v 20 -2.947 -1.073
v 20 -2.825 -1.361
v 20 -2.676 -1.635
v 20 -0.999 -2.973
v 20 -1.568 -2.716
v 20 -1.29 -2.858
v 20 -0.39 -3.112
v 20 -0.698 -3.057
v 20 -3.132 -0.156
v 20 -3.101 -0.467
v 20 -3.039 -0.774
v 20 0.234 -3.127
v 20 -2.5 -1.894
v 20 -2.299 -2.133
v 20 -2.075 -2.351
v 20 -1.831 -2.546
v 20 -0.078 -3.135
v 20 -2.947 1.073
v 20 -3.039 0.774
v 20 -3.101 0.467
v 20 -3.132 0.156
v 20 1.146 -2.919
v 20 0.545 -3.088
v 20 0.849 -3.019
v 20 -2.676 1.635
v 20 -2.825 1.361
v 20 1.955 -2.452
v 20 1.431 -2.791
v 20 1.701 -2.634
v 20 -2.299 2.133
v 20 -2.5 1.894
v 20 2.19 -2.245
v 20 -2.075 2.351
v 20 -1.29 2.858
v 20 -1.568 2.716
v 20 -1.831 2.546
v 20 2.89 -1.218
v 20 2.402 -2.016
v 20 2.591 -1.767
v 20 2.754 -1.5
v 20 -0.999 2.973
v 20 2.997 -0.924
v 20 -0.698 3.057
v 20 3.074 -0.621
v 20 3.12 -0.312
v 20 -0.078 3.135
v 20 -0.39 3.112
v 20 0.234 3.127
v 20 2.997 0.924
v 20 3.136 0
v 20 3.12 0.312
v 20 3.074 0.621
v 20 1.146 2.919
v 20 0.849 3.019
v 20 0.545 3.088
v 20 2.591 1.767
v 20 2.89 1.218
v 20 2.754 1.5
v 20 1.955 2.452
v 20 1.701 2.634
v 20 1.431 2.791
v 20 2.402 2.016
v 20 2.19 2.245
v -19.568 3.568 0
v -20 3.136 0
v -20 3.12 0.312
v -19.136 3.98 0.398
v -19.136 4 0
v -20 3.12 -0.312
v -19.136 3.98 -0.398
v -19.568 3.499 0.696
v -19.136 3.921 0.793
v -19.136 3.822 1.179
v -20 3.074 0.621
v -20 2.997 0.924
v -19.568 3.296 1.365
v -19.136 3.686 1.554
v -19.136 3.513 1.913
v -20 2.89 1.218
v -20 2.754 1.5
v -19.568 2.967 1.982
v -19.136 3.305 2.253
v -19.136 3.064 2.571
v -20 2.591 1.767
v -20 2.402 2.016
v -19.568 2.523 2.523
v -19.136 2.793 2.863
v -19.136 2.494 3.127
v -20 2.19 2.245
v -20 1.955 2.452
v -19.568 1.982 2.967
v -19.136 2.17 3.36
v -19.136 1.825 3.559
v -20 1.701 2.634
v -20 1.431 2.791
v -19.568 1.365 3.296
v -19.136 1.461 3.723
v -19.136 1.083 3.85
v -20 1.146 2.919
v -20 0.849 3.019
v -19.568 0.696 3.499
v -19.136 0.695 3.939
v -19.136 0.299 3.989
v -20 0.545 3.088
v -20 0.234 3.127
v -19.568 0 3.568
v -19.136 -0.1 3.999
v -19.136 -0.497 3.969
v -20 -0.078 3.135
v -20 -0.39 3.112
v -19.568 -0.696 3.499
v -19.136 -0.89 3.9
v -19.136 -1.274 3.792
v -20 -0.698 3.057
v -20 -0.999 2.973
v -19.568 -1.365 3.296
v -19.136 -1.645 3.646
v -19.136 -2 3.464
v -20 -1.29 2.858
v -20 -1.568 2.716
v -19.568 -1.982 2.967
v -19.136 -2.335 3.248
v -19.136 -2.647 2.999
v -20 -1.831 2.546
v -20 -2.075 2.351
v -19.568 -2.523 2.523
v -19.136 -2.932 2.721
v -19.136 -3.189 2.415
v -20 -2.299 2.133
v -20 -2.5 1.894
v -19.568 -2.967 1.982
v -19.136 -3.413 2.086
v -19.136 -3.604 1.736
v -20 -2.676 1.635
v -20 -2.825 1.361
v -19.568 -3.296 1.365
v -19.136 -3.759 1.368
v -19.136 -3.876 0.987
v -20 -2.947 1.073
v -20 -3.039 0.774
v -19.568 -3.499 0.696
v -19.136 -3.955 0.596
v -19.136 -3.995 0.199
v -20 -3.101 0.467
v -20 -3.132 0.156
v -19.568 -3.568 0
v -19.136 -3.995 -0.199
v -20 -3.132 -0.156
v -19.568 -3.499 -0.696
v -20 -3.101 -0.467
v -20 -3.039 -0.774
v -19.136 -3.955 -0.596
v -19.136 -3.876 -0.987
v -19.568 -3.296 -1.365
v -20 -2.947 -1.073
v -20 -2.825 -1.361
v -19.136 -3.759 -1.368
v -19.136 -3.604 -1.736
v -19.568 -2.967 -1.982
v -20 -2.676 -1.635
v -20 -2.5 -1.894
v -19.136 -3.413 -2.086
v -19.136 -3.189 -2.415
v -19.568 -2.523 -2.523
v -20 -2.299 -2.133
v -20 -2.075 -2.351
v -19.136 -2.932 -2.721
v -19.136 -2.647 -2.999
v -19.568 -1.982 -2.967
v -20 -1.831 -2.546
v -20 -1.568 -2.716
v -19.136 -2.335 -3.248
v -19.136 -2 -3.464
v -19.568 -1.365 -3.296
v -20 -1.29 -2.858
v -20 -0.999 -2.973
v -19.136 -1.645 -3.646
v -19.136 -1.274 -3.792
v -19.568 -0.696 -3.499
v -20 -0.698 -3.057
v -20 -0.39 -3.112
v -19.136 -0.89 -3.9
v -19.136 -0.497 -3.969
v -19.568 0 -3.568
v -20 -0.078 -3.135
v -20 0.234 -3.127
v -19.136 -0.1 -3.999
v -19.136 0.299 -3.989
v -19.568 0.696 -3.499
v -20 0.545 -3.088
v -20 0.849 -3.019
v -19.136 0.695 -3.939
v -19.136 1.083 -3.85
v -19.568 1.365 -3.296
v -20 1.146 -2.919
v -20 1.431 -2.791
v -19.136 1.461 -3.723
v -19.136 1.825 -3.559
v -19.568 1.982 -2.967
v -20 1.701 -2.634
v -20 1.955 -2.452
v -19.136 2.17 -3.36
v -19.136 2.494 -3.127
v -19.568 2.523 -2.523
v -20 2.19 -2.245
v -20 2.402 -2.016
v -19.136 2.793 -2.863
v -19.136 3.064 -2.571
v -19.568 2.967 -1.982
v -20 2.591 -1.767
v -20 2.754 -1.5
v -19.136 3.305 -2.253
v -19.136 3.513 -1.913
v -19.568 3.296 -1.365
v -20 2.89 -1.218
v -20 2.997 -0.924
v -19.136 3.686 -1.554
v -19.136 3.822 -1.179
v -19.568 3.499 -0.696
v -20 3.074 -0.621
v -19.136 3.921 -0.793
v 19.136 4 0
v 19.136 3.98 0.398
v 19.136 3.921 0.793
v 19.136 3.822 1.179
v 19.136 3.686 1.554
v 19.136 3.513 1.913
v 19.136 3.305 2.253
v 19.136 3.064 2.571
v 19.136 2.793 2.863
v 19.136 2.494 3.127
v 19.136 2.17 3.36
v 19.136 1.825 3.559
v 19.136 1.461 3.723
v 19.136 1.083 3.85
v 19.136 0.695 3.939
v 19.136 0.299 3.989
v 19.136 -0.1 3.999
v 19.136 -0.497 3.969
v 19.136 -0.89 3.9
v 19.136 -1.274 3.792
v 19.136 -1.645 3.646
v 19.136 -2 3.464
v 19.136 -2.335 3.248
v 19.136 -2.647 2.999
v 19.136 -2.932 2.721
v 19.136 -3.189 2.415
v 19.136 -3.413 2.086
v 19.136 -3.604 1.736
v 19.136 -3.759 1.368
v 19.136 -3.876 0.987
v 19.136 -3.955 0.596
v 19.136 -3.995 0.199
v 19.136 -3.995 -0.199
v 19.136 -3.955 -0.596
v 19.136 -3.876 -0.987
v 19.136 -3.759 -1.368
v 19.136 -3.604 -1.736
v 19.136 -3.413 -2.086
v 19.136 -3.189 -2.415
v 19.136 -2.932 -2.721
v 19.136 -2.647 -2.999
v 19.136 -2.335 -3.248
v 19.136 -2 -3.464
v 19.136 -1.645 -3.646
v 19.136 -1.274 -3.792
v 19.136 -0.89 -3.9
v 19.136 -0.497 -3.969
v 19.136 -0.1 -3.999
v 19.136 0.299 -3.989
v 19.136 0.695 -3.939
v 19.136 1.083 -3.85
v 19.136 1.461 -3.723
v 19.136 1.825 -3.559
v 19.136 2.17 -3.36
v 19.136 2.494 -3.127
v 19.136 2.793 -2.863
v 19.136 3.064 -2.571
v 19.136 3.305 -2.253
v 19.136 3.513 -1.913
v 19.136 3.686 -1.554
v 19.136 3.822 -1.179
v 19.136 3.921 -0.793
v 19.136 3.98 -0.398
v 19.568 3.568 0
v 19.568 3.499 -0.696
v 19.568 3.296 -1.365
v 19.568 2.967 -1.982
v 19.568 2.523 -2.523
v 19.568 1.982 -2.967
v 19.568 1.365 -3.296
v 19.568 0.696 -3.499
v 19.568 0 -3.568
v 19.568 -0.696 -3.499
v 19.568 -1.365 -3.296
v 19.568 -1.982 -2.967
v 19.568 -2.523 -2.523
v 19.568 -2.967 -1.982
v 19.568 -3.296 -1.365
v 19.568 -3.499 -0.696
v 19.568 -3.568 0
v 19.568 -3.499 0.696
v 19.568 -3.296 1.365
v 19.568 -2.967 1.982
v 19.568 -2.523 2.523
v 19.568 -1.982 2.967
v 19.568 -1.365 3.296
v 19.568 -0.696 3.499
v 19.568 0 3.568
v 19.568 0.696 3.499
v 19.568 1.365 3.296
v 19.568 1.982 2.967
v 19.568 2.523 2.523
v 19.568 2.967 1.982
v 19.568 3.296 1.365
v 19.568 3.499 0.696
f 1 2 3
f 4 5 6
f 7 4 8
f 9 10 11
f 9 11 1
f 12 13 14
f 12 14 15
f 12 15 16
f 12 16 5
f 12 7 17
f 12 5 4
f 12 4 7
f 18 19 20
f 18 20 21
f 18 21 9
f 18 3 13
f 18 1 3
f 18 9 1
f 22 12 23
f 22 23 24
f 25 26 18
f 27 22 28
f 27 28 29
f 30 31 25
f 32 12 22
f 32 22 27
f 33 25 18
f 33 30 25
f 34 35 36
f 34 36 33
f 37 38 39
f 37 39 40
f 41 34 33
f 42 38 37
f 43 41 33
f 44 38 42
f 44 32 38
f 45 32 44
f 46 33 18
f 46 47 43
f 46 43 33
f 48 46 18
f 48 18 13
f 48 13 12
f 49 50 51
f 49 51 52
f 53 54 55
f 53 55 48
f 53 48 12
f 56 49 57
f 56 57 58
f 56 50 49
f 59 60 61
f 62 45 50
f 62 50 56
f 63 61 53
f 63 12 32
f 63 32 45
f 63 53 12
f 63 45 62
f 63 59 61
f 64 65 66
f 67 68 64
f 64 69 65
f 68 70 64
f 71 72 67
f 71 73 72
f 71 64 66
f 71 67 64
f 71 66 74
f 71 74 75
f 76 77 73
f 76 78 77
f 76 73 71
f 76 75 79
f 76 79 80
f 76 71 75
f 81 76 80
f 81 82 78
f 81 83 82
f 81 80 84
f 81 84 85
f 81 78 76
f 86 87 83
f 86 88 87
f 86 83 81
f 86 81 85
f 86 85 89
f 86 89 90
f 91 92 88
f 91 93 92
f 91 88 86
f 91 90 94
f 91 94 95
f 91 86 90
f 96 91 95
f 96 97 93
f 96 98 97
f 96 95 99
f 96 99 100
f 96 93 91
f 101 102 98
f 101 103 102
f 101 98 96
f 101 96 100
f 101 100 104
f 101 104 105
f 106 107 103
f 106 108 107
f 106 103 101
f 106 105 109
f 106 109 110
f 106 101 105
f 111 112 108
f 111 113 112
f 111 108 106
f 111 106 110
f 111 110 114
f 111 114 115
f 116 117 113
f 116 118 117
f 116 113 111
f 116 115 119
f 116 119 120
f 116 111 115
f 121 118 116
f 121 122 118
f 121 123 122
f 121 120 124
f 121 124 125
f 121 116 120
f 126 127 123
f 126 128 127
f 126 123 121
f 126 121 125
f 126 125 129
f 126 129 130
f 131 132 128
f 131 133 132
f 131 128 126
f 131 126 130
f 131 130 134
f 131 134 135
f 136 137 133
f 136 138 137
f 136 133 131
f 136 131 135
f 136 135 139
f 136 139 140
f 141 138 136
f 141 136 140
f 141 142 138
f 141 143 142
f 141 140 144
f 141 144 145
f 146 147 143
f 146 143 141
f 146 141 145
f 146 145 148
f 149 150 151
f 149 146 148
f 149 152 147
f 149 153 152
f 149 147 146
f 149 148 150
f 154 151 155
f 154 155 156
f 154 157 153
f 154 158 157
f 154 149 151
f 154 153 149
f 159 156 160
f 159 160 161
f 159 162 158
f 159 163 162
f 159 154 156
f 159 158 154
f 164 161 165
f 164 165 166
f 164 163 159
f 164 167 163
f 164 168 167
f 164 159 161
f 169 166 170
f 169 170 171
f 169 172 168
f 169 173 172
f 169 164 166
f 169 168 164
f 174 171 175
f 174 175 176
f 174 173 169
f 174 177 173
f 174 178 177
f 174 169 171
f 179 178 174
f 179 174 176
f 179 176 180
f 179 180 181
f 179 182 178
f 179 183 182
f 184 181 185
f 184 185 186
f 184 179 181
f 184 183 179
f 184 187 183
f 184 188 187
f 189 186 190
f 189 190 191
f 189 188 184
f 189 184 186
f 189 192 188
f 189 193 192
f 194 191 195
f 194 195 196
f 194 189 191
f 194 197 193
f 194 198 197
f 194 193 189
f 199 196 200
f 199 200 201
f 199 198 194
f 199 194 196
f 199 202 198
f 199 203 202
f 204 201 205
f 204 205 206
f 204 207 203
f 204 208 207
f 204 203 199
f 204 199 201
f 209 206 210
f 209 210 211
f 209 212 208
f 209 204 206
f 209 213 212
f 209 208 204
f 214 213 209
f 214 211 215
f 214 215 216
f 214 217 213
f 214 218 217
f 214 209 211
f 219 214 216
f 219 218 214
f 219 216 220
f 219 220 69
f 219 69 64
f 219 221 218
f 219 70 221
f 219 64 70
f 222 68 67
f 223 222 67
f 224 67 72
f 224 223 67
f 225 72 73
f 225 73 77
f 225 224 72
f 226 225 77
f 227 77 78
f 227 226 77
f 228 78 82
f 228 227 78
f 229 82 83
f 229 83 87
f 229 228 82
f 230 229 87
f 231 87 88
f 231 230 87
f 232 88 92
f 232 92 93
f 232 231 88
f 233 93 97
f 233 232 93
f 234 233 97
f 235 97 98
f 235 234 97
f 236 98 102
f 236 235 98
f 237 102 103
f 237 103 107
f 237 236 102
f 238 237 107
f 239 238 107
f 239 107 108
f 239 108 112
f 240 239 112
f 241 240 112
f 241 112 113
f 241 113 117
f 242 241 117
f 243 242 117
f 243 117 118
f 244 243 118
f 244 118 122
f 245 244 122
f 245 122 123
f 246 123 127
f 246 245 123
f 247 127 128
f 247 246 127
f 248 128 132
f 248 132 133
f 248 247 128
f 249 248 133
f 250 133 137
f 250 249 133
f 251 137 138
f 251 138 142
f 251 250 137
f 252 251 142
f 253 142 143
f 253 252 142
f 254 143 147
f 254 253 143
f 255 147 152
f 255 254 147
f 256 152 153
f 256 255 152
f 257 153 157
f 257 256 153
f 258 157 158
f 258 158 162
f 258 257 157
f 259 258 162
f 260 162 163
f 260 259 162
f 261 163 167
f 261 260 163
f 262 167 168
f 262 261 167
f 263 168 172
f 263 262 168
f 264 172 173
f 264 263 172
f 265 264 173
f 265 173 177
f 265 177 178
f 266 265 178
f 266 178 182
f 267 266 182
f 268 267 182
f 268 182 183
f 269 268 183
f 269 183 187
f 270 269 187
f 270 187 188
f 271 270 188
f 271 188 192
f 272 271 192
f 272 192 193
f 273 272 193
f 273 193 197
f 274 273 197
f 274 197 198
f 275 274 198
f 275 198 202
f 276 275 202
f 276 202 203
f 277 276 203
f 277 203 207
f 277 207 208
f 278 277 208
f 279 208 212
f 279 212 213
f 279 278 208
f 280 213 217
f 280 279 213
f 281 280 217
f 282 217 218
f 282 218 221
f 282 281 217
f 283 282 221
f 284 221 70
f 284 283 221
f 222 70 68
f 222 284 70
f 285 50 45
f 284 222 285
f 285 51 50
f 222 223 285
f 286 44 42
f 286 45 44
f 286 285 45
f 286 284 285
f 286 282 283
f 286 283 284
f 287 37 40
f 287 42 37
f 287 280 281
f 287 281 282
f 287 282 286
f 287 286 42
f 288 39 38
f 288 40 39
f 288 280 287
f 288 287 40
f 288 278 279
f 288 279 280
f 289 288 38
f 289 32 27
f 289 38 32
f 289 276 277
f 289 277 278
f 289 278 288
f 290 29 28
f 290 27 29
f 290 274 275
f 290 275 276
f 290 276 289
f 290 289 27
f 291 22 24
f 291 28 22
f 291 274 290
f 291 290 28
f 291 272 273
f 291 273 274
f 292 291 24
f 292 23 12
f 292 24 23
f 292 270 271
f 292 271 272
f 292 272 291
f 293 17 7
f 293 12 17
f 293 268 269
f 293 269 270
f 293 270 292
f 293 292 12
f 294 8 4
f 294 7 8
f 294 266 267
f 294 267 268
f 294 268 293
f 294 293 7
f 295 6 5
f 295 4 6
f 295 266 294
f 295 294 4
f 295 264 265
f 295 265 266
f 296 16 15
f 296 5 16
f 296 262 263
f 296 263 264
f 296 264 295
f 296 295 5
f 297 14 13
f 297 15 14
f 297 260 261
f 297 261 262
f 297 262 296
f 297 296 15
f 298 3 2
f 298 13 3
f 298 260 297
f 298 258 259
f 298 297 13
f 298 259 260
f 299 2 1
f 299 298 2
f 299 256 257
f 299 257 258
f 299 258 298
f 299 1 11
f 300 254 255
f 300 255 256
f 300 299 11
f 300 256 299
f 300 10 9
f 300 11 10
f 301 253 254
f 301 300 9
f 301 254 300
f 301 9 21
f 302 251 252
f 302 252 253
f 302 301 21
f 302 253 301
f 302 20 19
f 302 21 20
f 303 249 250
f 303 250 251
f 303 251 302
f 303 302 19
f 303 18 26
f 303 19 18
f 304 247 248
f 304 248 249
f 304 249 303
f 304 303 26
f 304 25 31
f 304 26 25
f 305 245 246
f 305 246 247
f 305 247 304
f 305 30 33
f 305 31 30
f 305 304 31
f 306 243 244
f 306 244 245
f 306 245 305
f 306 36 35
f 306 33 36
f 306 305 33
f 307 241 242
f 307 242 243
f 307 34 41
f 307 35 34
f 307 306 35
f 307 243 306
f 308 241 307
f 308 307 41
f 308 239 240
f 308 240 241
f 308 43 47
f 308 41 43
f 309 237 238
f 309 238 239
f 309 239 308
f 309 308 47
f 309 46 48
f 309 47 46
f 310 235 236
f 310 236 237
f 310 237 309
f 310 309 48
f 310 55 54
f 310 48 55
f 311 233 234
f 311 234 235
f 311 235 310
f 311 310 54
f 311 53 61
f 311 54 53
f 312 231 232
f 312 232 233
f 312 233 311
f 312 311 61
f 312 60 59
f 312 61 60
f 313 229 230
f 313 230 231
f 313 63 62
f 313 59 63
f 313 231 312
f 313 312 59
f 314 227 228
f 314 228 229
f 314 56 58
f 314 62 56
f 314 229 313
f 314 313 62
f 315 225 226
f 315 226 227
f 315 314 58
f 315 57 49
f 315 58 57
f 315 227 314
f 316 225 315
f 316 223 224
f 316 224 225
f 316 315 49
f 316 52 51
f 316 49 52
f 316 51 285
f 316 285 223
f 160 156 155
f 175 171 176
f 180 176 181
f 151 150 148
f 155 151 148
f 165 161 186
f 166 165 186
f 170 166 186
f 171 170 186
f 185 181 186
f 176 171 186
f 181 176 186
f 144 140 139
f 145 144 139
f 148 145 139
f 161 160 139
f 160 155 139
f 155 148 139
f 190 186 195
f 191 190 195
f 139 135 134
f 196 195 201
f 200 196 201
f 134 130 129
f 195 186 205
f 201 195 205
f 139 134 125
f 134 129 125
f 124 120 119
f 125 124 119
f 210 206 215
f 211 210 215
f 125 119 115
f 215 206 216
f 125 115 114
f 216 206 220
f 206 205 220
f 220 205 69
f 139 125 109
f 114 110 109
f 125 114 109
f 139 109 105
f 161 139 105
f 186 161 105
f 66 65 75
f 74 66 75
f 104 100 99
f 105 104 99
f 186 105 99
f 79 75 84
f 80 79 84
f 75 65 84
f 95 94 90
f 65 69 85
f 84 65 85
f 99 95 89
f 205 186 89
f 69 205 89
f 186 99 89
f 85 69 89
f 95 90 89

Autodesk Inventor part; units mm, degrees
ref_plane "YZ Plane" through (0, 0, 0) normal (1, 0, 0) x (0, 1, 0)
ref_plane "XZ Plane" through (0, 0, 0) normal (0, 1, 0) x (-1, 0, 0)
sketch "Schizzo1" plane through (0, 0, 0) normal (0, 0, 1) x (1, 0, 0)
  line L0 (20, 4) -> (20, 0)
  line L1 (-20, 0) -> (20, 0)
  line L2 (-28, 0) -> (28, 0) projected
  line L3 (0, 4.8) -> (0, -0.8) projected
  line L4 (-20, 4) -> (-20, 0)
  line L5 (0, 4) -> (0, 0) construction
  line L6 (-28, 0) -> (28, 0) projected
  line L7 (-20, 4) -> (20, 4)
  dimension "d13" = 8
  dimension "d87" = 40
  dimension "d88" = 20
revolve "Corpo" add sketch "Schizzo1" angle 360 about axis through (-20, 0, 0) along (1, 0, 0)
thread "Filettatura1" size "M8x1.25" class "6g" standard "ISO Metric profile" length 40
chamfer "Smusso1" distance 0.864 angle 45 1 edges at (20, -4, 0) measured on face at (-6.6667, 3.987, -0.3219)
chamfer "Smusso2" distance 0.864 angle 45 1 edges at (-20, -4, 0) measured on face at (-6.9547, 3.9482, -0.6416)
ref_plane "Work Plane1" through (2.75, 0, 0) normal (0, -1, 0) x (1, 0, 0)
equation "\"d13\" = NND"
equation "\"d87\" = NLG"
equation "\"d88\" = 0.5 * NLG"
equation "\"d1\" = GEL"
equation "\"d9\" = -0.5 * SPD + 0.5 * NND"
equation "\"d10\" = -0.5 * SPD + 0.5 * NND"
equation "\"d11\" = -0.5 * SPD + 0.5 * NND"
equation "\"d12\" = -0.5 * SPD + 0.5 * NND"
equation "\"NLG\" = 40"
equation "\"GEL\" = NLG"
equation "\"GAL\" = 0.61345 * PTC"
equation "\"SPD\" = 6.272"
equation "\"d0\" = NND"
equation "\"GUL\" = 0.61345 * PTC"
equation "\"NND\" = 8"
equation "\"GUL1\" = GUL"
equation "\"GAL1\" = GAL"
equation "\"d80\" = -GUL - GEL"
equation "\"d86\" = -GEL + GUL1"
equation "\"PTC\" = 1.25"
equation "\"THREADDIA\" = 8"
equation "\"TOA\" = 30deg"
equation "\"GD1\" = THREADDIA - 1.2269 * PTC"
properties part number "DIN 976-1 - M8 x 40 - B" material "Acciaio, Dolce"
